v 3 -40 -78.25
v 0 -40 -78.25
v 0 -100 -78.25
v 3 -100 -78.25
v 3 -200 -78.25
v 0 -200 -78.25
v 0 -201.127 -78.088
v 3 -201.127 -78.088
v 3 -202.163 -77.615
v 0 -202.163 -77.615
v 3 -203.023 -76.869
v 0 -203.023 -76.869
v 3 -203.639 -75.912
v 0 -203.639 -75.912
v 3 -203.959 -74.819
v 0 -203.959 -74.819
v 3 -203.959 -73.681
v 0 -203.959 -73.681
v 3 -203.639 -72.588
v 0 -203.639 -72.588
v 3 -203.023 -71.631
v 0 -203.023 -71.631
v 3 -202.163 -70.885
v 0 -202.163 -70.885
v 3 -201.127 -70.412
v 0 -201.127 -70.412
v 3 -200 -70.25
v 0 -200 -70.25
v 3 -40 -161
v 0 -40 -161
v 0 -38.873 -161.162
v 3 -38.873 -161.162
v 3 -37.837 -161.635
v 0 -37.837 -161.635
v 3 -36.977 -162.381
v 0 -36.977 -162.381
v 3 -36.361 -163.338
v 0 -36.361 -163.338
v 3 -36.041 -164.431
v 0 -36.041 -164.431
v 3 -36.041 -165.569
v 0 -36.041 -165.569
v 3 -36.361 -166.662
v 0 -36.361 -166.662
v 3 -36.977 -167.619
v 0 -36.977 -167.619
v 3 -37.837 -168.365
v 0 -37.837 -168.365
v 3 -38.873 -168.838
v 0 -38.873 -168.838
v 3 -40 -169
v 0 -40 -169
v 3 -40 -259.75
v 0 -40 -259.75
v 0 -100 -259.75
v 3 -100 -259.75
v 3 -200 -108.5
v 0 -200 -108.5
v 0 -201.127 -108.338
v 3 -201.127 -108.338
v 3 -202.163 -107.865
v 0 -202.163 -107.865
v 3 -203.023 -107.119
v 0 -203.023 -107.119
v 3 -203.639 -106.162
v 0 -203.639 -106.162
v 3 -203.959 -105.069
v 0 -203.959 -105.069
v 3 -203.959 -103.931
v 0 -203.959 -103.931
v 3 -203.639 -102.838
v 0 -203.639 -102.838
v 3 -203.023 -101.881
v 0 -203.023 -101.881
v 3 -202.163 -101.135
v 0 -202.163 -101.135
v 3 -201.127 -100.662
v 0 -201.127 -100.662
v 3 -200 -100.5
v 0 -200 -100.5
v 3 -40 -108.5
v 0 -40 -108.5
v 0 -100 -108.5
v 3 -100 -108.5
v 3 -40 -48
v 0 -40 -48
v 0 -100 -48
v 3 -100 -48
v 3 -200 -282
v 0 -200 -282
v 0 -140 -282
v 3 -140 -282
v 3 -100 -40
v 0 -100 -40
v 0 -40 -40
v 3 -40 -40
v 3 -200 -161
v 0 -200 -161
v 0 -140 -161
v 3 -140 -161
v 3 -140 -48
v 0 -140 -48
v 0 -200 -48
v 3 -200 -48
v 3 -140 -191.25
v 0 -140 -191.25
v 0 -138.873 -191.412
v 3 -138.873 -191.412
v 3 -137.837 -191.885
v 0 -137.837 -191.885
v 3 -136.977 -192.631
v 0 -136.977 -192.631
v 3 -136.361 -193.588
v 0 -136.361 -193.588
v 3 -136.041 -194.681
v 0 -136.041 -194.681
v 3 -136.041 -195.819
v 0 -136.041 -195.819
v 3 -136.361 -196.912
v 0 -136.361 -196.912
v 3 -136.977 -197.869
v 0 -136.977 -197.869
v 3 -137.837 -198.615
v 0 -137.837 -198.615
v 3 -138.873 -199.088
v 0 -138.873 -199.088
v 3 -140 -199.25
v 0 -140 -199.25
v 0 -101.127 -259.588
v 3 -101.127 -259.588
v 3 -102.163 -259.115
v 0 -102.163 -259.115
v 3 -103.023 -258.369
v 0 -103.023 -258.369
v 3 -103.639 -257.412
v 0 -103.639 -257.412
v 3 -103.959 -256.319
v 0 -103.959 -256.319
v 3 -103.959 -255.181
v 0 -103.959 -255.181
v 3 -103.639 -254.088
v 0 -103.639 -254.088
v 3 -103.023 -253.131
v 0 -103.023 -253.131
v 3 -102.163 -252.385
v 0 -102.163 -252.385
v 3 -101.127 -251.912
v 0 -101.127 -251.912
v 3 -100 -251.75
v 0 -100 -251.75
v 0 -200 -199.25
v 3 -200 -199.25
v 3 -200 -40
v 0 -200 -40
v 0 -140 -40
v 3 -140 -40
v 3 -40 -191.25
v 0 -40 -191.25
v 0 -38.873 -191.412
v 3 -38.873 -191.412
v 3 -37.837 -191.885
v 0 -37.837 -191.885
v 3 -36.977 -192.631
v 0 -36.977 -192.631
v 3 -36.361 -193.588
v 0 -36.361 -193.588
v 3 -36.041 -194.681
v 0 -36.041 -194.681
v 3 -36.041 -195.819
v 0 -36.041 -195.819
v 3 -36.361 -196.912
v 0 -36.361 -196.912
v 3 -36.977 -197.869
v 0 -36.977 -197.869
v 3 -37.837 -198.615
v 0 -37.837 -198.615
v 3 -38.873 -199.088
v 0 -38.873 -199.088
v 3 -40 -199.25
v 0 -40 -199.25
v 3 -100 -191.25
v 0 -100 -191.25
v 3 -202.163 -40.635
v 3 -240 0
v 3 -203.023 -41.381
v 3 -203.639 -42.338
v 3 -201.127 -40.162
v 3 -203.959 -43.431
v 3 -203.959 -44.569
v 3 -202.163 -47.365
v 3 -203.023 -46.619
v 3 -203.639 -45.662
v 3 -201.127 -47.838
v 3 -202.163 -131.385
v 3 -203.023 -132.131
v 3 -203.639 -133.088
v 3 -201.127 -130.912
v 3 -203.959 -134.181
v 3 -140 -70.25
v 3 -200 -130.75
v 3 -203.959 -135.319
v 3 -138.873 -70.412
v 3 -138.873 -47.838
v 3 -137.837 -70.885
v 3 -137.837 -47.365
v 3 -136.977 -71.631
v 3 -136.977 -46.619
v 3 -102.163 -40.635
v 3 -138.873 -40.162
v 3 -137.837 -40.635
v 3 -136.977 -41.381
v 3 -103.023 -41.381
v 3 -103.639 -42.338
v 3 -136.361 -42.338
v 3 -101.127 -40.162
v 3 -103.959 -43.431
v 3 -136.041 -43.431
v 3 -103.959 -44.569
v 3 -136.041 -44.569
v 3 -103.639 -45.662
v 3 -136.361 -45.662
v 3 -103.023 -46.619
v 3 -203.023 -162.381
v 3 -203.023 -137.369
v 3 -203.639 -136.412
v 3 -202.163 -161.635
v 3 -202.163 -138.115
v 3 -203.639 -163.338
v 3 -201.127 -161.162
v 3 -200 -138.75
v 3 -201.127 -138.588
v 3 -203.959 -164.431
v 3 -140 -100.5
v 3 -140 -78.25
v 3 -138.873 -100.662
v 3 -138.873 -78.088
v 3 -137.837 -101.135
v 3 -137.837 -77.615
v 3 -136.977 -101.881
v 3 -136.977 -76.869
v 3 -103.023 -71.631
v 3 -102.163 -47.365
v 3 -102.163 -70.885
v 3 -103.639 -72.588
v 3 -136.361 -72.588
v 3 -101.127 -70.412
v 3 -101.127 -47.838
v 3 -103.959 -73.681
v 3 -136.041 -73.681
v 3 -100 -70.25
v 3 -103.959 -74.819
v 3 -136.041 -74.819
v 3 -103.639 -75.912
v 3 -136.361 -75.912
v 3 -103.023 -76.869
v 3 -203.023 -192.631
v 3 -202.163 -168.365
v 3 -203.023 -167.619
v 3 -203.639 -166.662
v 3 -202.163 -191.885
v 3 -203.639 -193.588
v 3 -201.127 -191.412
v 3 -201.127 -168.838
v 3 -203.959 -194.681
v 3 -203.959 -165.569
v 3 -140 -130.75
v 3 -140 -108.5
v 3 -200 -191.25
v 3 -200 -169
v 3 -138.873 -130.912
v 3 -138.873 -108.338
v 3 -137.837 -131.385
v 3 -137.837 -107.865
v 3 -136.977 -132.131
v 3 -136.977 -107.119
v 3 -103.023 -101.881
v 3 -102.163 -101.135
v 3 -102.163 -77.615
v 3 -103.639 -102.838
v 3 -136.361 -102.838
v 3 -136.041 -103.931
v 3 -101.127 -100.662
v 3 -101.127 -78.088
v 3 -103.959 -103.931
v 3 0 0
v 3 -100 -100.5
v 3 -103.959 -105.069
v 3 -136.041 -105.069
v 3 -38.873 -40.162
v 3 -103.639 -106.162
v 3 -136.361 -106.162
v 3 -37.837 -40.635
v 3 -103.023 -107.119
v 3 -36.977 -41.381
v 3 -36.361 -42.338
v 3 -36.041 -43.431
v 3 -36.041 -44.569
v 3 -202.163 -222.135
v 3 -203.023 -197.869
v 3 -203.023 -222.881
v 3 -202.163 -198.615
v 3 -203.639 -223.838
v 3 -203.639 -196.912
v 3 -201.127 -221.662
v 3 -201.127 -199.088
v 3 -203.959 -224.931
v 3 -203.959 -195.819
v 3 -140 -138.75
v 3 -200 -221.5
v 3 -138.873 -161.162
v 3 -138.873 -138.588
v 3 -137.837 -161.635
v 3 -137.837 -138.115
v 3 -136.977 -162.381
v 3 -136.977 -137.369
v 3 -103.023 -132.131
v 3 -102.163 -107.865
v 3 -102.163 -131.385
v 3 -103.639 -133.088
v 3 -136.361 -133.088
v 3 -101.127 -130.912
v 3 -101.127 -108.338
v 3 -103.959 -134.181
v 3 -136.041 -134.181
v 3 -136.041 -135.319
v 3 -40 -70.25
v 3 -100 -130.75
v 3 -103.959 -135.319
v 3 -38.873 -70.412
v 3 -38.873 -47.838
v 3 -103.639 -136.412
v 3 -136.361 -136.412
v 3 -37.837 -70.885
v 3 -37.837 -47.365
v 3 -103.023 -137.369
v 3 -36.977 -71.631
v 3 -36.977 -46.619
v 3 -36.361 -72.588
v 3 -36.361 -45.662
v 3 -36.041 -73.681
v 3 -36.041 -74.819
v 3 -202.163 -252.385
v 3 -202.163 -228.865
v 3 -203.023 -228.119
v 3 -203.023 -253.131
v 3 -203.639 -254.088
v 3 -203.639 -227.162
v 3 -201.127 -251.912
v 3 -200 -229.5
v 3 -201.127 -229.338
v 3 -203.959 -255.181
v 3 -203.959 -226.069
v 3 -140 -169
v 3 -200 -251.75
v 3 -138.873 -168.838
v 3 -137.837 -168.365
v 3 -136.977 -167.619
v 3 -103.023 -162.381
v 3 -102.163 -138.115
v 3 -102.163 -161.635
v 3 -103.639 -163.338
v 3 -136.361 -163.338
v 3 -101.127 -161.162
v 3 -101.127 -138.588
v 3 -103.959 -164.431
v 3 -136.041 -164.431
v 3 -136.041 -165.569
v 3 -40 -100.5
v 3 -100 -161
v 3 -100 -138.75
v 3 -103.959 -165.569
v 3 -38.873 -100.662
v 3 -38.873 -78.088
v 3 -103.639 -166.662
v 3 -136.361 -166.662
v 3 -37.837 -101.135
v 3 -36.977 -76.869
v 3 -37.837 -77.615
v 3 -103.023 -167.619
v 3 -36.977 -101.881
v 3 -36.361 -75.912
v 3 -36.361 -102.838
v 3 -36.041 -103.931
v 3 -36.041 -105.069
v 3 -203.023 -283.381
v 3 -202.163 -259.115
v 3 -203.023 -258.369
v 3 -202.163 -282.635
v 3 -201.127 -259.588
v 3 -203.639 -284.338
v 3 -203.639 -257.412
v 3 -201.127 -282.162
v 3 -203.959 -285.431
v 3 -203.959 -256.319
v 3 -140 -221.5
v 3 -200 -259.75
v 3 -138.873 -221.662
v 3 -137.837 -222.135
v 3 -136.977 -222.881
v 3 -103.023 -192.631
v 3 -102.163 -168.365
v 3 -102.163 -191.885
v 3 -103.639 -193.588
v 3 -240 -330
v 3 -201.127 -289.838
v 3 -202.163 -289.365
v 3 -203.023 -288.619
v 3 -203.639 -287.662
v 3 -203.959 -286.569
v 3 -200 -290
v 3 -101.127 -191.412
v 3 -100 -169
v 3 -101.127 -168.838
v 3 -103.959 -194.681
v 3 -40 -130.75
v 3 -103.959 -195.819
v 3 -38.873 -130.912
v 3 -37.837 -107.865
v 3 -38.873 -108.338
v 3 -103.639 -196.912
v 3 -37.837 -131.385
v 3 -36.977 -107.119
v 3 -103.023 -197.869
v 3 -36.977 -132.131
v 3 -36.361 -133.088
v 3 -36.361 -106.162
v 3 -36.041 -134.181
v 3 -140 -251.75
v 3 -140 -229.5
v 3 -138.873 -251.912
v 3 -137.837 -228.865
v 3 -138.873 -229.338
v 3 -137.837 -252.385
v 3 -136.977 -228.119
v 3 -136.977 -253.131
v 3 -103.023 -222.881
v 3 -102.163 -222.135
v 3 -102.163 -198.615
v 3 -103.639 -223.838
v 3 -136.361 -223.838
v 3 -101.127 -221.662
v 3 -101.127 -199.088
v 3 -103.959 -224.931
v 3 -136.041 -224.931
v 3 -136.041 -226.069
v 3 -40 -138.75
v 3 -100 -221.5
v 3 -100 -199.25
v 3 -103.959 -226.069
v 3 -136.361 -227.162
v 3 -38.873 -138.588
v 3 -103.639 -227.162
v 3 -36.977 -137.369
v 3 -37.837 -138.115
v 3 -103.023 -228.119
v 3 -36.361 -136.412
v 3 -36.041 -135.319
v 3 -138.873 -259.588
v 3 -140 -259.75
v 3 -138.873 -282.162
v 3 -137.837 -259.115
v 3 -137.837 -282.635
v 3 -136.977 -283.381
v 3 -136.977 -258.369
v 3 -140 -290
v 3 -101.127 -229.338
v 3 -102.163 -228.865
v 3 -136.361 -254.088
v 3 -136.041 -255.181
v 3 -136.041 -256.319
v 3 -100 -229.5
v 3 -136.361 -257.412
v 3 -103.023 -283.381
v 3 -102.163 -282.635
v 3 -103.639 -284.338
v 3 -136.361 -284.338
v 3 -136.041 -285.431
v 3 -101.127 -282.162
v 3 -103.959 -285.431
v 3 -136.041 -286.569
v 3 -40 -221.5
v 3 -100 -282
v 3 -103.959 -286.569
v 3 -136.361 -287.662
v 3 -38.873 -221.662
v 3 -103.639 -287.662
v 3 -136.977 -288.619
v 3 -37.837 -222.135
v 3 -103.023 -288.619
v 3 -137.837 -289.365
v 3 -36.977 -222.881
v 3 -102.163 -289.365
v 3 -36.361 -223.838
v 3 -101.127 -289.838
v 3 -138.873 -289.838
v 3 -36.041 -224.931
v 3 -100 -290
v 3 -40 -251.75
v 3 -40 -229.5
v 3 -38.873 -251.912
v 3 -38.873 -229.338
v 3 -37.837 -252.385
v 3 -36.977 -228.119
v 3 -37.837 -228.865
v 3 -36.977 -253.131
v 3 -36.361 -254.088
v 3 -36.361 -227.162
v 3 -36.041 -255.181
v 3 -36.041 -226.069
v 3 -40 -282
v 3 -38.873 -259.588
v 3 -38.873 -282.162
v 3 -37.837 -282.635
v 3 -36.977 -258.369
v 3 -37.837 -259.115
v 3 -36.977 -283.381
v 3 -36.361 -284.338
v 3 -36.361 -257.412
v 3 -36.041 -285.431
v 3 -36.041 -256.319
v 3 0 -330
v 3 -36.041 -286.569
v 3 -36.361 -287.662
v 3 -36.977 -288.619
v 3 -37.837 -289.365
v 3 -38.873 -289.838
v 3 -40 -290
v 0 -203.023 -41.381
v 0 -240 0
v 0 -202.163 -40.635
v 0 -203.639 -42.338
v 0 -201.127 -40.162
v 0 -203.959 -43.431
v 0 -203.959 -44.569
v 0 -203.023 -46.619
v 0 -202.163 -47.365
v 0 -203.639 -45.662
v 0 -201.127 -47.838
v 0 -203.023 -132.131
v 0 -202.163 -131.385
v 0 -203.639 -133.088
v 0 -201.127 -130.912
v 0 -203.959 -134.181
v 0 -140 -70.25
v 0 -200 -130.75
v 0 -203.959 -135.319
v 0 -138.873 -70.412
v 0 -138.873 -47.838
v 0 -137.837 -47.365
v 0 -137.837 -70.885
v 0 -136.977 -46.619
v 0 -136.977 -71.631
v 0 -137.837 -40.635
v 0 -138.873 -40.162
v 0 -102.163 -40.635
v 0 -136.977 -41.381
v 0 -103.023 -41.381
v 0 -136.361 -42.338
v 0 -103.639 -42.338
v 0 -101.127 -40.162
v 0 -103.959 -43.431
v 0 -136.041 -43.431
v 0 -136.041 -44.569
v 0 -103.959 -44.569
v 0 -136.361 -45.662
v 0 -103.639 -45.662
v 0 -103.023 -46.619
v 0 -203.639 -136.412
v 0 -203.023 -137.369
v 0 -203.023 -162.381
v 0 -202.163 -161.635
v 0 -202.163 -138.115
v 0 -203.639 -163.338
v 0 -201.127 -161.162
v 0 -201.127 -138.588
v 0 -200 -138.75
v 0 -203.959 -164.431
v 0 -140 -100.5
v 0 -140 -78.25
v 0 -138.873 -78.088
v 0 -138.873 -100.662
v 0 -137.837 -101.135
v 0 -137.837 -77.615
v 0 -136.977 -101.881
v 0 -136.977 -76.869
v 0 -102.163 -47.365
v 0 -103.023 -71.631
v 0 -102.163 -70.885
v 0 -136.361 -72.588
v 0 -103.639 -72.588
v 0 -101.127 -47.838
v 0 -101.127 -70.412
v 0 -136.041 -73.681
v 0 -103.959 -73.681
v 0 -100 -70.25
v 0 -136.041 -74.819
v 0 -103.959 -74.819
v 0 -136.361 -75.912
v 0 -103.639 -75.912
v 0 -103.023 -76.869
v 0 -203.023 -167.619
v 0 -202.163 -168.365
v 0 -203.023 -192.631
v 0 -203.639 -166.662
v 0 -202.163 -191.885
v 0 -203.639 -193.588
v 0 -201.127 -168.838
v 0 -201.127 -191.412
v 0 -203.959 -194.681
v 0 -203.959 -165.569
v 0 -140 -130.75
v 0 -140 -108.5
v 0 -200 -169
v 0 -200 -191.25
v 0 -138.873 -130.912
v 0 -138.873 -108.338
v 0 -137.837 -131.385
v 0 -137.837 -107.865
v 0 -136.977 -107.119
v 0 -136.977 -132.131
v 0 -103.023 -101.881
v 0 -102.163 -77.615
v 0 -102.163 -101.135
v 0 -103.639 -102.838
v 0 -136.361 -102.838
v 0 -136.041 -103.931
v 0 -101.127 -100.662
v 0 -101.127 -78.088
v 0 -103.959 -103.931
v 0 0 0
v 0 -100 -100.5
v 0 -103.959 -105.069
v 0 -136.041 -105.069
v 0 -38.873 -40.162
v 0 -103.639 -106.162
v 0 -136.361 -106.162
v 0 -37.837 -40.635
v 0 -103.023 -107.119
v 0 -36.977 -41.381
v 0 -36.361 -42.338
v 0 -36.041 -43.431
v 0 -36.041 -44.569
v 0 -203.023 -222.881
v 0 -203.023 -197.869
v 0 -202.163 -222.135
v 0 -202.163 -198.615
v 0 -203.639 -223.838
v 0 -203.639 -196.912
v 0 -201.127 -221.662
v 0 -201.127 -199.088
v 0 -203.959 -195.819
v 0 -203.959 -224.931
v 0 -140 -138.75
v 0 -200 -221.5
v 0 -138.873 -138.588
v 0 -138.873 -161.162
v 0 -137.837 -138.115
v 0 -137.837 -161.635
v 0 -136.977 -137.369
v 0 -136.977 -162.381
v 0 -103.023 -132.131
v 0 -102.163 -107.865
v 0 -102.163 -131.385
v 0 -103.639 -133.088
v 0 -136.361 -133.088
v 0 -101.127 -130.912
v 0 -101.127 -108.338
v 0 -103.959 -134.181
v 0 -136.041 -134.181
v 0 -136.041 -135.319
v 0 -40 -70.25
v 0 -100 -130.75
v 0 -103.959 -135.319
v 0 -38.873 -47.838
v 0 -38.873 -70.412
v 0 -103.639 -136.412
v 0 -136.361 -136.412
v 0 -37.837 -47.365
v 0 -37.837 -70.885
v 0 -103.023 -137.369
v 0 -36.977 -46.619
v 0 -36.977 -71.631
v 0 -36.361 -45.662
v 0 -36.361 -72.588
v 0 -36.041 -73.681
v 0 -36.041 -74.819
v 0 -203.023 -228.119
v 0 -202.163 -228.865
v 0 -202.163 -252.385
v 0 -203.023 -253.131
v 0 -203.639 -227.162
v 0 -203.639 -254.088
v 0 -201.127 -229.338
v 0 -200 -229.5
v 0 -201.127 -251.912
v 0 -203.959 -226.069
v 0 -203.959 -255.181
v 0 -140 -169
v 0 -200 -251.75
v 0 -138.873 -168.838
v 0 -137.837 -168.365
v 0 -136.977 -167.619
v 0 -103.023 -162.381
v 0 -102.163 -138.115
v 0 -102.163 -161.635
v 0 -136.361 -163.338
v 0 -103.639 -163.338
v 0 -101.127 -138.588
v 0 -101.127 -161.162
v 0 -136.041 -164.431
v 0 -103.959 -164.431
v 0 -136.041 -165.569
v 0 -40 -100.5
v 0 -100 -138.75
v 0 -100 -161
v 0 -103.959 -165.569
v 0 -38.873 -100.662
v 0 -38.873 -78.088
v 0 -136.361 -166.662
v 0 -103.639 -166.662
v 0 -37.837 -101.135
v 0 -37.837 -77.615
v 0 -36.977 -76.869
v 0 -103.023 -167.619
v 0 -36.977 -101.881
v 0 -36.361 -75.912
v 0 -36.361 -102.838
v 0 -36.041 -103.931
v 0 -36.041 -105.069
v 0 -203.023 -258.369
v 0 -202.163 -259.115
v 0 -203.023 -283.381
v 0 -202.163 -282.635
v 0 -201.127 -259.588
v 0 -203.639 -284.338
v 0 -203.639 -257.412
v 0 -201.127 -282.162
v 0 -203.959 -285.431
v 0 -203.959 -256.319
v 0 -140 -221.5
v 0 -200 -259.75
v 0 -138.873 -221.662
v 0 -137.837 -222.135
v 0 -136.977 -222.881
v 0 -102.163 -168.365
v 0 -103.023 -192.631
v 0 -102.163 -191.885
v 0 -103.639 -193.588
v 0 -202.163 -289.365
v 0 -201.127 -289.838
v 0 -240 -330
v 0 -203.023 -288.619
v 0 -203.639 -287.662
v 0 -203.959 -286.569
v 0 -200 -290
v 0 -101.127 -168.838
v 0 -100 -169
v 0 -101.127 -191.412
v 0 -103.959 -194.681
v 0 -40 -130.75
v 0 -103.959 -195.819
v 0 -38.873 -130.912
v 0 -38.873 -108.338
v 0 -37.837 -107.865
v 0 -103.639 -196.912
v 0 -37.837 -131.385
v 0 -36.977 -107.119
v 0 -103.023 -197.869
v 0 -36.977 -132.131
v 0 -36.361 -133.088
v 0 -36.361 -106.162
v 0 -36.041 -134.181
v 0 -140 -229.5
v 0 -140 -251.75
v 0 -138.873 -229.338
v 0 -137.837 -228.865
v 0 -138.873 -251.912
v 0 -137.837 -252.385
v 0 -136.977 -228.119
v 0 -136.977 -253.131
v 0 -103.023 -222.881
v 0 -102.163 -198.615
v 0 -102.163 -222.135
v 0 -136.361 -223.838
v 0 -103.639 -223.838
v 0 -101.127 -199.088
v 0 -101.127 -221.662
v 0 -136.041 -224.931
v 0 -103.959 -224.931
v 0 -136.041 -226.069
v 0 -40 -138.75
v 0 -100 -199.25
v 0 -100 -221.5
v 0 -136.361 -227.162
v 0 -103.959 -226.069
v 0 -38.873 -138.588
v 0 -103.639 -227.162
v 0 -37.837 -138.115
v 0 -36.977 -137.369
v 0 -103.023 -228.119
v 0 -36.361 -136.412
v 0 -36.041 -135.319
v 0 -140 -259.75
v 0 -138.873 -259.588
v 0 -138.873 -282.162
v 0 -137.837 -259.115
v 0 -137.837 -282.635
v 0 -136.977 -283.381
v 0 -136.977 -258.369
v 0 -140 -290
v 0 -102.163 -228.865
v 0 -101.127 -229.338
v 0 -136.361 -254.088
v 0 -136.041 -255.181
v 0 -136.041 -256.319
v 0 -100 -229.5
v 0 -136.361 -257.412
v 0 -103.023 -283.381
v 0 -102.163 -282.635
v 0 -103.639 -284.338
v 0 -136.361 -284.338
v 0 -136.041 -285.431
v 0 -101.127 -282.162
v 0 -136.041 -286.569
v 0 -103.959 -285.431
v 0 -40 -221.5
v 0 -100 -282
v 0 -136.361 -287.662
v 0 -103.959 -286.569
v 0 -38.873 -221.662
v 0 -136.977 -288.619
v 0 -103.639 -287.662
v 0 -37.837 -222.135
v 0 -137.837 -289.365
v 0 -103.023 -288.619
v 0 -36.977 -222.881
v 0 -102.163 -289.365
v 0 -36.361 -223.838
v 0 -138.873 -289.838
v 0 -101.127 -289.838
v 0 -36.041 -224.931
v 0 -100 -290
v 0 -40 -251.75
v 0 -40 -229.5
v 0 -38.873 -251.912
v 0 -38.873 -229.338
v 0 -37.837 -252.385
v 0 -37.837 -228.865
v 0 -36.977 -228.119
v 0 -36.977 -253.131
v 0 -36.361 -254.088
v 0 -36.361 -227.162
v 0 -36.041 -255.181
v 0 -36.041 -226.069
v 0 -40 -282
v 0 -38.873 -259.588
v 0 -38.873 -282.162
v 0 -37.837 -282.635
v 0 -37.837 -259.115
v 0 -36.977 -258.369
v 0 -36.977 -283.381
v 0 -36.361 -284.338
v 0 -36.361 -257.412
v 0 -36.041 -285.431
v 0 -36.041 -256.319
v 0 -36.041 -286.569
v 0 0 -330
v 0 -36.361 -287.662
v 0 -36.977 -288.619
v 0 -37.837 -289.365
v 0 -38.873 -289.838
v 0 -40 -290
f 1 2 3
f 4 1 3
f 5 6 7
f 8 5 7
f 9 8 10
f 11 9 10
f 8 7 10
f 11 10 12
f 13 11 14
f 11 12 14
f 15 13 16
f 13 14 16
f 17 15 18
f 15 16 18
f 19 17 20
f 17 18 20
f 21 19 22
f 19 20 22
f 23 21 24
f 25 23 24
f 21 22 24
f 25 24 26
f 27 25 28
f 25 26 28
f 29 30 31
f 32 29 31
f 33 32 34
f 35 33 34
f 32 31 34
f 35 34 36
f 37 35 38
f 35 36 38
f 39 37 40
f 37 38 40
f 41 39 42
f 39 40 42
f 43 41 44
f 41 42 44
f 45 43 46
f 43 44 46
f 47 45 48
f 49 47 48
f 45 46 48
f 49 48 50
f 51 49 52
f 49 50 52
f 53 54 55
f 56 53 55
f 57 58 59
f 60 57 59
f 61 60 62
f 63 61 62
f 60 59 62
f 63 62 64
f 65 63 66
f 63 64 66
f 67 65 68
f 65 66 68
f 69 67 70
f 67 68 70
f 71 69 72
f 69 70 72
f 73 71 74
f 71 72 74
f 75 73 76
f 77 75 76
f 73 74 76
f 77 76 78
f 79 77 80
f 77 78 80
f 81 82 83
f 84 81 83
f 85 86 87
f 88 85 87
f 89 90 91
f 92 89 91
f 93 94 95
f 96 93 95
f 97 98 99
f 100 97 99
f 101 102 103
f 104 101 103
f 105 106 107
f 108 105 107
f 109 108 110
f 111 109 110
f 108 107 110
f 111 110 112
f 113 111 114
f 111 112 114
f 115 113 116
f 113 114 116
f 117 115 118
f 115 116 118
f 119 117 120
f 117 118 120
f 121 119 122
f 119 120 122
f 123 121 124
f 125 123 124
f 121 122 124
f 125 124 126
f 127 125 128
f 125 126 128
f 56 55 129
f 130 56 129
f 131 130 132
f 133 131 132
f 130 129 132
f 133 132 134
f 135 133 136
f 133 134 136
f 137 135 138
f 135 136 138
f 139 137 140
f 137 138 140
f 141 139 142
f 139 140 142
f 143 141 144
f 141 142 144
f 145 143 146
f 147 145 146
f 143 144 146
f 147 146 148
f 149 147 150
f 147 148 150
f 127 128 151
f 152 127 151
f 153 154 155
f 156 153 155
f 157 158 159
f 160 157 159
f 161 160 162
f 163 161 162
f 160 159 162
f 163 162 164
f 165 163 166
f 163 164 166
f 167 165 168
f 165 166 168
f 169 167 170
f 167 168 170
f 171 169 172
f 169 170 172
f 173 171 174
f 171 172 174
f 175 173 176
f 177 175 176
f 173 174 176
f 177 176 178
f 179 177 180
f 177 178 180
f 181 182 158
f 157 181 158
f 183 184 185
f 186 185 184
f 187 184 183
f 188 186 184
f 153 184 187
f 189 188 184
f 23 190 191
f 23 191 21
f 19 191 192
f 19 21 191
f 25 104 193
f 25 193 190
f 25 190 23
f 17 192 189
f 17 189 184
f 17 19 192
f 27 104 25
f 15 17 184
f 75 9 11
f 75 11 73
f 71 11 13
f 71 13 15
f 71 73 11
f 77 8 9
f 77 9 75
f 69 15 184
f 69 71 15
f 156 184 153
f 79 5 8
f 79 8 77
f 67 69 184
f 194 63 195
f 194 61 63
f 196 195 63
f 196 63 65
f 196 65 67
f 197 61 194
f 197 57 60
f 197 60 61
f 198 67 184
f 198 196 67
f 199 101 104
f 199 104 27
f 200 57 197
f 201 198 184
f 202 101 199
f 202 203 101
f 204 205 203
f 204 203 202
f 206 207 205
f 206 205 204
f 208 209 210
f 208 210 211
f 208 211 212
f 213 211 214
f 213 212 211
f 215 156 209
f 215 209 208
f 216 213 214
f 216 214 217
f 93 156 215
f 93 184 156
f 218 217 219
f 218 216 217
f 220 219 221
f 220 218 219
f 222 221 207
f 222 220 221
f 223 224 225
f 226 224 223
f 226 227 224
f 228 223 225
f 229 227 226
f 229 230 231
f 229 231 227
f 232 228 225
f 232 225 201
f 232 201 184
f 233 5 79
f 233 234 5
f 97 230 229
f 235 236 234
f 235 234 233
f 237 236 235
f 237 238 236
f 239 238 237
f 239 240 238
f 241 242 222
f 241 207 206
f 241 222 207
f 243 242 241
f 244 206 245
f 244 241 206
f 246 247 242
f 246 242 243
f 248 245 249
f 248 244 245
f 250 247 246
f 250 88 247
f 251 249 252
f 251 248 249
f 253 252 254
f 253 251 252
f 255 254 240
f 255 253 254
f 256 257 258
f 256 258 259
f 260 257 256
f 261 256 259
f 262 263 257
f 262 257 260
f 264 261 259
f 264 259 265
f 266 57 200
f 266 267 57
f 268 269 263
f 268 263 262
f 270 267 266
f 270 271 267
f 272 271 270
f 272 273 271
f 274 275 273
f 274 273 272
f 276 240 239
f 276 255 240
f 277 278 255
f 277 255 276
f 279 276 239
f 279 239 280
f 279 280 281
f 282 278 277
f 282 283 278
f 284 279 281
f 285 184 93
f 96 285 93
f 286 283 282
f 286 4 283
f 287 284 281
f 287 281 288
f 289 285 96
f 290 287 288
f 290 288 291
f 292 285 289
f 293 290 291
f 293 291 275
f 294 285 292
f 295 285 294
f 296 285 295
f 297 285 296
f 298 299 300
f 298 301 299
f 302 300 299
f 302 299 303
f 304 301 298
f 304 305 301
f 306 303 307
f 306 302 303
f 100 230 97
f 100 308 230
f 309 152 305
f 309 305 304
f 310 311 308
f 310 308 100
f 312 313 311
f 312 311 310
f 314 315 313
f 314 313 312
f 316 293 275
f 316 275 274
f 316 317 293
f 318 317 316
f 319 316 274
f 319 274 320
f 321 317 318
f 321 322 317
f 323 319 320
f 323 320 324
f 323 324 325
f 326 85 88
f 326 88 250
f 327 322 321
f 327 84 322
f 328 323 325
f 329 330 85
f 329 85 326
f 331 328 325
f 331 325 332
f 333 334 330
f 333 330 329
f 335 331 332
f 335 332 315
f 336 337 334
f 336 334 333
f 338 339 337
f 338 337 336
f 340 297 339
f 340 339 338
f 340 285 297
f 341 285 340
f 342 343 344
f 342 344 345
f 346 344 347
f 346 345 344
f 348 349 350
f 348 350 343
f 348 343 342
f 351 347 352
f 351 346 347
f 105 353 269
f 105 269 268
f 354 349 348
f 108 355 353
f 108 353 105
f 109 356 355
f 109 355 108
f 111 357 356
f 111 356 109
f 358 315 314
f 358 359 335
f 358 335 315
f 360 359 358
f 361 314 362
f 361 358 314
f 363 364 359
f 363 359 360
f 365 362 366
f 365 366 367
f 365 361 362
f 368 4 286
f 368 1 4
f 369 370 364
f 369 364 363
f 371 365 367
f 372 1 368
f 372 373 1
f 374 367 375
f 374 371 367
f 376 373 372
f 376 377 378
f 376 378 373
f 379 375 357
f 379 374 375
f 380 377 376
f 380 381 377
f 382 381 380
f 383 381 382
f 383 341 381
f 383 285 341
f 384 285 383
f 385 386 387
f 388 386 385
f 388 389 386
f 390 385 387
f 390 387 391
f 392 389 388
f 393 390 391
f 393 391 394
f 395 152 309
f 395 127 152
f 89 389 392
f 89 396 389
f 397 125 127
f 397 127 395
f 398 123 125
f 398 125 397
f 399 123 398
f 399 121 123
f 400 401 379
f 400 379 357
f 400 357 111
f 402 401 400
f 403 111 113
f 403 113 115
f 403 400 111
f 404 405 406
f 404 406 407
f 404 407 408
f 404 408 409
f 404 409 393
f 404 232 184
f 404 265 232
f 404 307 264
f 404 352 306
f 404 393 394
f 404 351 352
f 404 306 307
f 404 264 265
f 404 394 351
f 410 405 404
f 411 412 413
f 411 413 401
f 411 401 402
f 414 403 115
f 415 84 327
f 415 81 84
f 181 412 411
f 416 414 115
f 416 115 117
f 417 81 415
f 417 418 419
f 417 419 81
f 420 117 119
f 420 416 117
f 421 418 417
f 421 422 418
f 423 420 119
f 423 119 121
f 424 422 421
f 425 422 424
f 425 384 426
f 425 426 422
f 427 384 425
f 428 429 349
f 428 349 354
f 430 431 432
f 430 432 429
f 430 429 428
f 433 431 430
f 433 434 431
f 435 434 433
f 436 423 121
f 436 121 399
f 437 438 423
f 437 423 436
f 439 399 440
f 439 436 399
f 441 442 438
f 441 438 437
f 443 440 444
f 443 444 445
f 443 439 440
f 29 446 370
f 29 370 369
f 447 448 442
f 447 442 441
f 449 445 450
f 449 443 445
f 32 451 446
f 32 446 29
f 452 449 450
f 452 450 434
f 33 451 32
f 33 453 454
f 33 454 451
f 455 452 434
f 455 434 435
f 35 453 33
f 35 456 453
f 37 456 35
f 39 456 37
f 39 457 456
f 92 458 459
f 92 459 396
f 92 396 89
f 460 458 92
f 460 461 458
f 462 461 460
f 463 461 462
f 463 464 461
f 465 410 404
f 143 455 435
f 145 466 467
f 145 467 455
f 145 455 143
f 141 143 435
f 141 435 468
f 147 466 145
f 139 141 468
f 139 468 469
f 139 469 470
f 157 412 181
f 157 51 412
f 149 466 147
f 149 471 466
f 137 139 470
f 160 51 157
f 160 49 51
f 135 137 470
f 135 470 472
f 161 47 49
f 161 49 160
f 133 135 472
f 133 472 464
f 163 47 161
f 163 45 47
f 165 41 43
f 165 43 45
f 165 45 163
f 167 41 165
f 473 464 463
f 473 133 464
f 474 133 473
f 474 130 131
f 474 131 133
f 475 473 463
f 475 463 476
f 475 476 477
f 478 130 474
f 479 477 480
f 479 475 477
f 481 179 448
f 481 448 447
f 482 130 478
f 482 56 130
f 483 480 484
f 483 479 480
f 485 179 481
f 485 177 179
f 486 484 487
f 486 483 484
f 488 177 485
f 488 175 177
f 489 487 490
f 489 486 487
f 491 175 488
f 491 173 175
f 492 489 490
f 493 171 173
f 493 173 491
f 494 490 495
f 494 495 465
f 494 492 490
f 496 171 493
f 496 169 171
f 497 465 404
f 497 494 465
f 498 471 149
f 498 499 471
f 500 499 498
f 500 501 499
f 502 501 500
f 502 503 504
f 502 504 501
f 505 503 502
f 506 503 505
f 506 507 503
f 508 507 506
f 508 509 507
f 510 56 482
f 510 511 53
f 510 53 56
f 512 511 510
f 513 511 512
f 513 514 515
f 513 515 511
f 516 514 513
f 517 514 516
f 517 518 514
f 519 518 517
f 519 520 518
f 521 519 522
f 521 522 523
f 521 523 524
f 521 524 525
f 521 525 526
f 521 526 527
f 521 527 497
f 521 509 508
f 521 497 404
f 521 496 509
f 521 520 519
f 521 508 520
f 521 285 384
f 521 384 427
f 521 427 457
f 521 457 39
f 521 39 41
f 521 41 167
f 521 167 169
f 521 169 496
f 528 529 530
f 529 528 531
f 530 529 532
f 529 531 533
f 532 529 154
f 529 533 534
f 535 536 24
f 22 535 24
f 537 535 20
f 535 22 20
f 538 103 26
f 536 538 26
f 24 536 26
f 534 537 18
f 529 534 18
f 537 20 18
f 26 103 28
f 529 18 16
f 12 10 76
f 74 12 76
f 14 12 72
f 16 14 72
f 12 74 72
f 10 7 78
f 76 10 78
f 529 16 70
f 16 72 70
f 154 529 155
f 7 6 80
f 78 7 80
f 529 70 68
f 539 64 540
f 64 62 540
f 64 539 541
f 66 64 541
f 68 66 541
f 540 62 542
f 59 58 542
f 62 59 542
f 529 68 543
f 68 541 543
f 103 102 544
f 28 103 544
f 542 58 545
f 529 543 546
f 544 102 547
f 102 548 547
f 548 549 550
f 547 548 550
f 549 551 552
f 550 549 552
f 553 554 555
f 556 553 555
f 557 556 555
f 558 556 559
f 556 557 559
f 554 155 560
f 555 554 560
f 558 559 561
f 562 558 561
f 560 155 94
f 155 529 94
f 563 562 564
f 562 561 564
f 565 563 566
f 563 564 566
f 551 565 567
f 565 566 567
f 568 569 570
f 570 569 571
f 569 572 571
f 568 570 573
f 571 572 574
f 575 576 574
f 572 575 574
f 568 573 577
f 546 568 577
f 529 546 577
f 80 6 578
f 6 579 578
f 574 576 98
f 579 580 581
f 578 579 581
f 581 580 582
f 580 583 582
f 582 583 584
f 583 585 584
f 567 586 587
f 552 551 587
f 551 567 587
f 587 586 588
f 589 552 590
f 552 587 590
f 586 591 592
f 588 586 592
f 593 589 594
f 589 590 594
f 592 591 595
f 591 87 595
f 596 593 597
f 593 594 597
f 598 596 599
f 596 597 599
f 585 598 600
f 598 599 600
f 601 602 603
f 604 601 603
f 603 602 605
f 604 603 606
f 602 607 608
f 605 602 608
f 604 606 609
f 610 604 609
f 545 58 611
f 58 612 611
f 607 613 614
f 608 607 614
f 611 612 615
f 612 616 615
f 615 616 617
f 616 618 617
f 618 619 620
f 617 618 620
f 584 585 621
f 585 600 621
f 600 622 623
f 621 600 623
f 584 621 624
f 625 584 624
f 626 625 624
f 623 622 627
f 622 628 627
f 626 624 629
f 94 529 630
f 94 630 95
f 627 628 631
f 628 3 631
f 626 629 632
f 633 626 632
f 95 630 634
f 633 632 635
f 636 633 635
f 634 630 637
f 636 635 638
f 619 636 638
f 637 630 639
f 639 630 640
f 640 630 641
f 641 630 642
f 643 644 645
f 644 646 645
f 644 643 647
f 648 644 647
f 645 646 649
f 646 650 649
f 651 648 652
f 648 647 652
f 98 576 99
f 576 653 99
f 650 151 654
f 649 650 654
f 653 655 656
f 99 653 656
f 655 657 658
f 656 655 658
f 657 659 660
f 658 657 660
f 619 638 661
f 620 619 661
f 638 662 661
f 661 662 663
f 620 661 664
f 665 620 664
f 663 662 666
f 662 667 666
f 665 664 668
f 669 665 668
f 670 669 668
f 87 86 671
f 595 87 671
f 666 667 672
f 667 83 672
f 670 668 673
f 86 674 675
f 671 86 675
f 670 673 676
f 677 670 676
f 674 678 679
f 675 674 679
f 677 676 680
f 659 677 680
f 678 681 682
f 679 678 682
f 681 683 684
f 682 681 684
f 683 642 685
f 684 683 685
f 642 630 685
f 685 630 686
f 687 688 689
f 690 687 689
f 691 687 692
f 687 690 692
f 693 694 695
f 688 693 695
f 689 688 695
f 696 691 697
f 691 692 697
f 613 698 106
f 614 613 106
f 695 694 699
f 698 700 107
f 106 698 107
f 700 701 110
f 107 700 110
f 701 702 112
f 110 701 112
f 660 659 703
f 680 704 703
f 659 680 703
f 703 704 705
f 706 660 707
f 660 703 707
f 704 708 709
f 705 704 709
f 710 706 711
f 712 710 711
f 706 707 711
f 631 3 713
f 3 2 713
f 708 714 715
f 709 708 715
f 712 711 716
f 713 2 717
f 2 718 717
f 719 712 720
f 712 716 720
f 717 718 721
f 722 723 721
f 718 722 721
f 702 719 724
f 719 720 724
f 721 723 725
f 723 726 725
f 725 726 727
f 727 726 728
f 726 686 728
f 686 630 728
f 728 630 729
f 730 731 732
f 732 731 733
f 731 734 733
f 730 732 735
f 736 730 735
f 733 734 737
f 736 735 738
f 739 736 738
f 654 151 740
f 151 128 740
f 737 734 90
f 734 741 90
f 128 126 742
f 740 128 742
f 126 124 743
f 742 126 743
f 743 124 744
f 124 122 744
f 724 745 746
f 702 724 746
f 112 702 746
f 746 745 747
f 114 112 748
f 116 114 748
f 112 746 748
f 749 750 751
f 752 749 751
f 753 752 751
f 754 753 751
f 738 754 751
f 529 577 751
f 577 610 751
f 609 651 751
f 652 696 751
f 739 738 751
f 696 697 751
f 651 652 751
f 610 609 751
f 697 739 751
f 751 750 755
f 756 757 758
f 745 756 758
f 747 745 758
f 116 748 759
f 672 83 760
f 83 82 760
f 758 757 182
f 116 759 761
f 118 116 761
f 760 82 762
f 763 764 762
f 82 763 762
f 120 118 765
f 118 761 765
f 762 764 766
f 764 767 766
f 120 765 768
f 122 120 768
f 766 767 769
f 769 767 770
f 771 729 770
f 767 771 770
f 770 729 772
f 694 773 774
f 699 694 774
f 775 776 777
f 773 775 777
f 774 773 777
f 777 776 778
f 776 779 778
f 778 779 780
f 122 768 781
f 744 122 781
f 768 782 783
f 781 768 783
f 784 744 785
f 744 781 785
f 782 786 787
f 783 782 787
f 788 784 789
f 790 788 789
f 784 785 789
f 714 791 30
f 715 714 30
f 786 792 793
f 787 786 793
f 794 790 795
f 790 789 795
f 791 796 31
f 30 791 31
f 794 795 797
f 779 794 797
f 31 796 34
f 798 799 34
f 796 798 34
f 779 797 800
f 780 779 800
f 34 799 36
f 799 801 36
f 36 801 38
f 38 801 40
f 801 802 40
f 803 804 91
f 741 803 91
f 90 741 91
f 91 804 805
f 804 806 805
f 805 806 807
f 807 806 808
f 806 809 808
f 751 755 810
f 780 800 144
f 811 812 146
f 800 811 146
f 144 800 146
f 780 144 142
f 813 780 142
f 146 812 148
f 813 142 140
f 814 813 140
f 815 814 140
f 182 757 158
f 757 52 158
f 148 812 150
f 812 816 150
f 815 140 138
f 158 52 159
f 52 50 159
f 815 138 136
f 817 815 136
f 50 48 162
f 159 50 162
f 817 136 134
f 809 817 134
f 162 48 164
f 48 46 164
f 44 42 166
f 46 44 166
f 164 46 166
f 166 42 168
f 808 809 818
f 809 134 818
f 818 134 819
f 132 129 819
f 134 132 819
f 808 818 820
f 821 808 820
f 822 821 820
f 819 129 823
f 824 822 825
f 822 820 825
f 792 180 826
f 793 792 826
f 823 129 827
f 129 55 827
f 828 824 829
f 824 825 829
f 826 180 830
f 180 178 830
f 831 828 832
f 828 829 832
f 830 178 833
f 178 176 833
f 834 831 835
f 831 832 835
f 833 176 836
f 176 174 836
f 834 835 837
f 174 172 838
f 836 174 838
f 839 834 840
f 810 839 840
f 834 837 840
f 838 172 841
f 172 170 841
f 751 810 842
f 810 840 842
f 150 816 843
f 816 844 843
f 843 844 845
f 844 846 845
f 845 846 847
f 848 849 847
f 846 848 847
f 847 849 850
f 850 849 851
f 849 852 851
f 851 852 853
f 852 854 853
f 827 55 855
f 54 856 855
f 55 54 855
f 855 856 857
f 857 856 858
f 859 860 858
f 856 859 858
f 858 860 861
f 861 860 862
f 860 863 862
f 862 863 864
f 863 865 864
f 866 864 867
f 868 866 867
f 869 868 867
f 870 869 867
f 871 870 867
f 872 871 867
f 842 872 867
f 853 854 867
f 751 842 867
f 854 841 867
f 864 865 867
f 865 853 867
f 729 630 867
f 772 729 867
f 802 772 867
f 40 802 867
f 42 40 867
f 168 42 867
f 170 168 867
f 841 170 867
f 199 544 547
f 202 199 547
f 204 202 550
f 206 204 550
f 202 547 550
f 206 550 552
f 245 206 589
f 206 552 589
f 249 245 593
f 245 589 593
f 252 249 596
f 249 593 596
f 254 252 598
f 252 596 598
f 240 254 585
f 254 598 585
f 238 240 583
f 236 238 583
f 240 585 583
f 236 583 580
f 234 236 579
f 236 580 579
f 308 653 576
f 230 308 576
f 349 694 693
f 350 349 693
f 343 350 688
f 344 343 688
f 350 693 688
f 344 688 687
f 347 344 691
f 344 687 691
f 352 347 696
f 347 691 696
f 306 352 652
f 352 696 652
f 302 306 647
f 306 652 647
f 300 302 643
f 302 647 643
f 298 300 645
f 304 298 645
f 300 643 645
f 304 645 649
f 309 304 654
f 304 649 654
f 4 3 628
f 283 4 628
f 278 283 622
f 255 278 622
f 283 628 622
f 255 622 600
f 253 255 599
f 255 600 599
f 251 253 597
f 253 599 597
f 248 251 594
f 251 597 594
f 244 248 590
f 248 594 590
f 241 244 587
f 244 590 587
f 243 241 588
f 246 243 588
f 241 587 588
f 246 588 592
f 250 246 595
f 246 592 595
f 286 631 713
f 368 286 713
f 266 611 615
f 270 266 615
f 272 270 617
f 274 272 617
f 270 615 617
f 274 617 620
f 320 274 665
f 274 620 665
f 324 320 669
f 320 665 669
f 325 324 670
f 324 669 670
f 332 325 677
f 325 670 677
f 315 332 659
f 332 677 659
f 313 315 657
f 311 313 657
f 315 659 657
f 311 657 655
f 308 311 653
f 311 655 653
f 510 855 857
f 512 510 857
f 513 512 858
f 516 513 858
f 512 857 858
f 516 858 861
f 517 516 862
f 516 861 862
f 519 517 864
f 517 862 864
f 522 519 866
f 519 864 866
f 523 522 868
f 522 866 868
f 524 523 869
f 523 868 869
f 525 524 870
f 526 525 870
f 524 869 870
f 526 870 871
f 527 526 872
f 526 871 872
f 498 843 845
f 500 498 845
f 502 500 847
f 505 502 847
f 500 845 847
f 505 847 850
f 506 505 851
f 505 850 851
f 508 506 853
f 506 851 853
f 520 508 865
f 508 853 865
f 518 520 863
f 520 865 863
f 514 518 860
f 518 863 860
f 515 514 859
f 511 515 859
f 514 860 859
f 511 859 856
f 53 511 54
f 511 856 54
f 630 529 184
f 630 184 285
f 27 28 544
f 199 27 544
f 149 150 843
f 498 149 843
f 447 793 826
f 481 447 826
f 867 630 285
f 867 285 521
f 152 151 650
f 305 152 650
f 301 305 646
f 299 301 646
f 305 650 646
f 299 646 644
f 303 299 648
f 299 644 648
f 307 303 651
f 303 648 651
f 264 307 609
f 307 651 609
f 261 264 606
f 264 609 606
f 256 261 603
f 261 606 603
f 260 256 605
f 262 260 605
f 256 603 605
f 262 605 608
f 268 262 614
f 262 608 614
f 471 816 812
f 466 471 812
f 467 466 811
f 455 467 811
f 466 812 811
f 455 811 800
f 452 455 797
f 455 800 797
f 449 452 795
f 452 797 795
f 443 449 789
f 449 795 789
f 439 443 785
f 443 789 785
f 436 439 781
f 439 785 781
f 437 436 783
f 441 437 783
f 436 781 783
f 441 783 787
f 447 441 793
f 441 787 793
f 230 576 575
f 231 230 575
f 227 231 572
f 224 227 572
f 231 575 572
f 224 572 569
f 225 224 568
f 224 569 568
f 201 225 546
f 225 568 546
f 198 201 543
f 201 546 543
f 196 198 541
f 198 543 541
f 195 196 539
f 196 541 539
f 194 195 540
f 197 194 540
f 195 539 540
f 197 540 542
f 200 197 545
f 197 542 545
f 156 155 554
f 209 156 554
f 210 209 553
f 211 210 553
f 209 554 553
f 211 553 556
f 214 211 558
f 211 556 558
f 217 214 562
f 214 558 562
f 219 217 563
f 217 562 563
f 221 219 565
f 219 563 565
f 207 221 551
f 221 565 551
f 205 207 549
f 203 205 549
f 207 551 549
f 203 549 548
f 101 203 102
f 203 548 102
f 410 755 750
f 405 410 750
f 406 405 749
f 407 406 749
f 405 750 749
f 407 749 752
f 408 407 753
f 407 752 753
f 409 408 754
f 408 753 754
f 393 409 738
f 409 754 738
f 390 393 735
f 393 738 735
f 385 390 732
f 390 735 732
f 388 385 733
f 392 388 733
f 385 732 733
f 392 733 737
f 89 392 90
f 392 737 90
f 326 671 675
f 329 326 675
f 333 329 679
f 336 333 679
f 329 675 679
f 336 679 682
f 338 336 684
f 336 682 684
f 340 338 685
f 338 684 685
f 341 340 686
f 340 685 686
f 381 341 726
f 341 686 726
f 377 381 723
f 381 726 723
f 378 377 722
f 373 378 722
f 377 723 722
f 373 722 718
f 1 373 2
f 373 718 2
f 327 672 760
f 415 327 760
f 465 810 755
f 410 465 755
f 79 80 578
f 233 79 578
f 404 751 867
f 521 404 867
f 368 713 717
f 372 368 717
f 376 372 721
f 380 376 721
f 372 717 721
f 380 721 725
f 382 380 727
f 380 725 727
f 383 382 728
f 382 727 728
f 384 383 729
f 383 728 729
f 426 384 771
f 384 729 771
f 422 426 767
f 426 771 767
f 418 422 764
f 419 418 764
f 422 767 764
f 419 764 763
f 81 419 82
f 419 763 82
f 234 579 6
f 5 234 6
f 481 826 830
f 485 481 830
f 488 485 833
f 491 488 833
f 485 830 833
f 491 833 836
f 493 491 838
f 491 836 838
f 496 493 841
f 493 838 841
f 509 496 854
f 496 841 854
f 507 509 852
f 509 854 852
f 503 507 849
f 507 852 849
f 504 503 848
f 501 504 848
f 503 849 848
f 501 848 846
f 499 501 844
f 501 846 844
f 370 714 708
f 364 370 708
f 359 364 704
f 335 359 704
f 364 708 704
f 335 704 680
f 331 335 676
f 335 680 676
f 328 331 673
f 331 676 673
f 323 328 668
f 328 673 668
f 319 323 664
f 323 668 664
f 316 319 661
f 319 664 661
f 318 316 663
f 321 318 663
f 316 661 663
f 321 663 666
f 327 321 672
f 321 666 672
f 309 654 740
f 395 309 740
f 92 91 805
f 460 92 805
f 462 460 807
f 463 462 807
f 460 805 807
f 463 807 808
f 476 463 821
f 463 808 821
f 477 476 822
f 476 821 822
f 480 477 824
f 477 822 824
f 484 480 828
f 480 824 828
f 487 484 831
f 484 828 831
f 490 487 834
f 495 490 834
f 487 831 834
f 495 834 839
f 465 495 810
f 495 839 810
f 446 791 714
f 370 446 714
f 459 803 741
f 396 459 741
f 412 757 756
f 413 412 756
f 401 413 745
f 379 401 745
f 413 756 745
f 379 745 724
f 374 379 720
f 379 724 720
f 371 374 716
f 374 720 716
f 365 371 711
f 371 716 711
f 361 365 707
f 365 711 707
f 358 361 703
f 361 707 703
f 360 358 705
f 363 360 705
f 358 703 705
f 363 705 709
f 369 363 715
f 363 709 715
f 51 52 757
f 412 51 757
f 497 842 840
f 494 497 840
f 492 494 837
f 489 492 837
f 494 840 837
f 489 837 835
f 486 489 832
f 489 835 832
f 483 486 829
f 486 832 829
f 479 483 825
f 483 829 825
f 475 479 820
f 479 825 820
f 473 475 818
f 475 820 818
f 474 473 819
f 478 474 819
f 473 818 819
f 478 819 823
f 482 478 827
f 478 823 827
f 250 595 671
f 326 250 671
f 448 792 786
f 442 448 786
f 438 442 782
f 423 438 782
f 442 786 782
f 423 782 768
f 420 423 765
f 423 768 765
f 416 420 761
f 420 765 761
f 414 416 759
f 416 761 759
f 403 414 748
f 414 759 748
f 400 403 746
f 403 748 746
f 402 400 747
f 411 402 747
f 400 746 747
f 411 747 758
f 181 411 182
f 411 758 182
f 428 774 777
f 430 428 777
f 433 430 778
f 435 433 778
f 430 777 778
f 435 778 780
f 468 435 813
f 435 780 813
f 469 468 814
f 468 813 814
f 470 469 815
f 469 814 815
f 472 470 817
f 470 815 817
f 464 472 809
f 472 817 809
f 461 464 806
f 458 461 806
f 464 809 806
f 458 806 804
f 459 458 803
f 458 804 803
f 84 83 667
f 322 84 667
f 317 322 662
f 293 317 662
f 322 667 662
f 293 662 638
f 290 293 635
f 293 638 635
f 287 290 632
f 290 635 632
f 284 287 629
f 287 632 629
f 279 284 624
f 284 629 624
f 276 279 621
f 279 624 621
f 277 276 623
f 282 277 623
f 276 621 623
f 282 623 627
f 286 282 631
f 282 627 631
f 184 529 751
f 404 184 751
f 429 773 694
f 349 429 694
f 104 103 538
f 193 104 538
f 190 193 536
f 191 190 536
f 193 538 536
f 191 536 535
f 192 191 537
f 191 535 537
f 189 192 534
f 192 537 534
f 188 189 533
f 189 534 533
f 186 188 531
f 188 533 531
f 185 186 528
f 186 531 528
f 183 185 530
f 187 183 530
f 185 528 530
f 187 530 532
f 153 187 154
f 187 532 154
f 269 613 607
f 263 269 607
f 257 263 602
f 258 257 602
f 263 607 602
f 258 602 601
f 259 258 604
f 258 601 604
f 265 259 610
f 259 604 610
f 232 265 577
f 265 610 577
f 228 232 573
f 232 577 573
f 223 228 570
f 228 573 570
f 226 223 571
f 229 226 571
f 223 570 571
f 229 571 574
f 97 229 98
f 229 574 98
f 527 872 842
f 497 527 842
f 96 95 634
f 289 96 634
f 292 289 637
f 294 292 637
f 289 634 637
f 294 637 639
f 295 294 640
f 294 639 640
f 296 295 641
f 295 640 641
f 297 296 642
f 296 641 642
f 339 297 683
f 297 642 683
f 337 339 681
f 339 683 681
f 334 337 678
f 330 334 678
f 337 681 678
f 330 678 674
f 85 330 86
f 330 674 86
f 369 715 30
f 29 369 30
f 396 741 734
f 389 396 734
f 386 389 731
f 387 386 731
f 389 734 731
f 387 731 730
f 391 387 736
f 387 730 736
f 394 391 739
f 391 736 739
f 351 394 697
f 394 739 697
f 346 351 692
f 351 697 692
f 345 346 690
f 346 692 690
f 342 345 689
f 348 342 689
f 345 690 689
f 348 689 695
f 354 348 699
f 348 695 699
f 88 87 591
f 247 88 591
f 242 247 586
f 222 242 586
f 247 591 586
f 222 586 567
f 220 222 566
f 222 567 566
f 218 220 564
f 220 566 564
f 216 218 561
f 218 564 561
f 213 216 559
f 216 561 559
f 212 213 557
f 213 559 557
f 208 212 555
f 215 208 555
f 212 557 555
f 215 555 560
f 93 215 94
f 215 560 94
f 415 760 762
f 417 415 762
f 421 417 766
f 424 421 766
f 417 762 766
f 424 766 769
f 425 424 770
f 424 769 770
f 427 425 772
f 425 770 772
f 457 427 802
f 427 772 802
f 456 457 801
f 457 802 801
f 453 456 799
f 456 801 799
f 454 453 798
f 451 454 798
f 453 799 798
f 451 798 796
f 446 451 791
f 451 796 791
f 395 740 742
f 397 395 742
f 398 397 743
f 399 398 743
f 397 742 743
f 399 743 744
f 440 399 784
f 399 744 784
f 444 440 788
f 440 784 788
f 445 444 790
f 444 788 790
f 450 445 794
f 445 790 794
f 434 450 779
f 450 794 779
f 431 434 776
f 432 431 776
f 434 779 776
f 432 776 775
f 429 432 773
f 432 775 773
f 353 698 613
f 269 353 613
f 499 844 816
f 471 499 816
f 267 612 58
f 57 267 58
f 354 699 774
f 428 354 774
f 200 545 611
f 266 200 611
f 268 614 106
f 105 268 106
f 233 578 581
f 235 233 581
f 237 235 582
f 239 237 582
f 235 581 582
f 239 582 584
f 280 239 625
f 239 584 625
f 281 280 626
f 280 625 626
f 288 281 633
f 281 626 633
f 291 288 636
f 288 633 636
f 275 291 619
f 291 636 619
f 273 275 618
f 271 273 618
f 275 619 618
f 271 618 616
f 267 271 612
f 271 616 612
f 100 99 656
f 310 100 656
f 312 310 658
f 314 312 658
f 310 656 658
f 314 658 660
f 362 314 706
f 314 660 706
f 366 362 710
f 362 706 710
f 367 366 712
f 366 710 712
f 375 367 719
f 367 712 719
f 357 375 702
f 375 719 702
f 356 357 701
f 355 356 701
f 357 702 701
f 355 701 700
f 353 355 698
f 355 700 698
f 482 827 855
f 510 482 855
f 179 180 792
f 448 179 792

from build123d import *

# Parameters (mm, degrees)
IZIM1_W                     = 330
IZIM1_H                     = 240
Y_KSEKLIK_EKSTR_ZYON1_DEPTH = 3


with BuildPart() as part:
    # Çizim1 → Yükseklik-Ekstrüzyon1 (new body)
    with BuildSketch(Plane(origin=(0, 0, 0), x_dir=(0, 0, -1), z_dir=(1, 0, 0))):
        with Locations((165, -120)):
            Rectangle(IZIM1_W, IZIM1_H)
        with BuildLine():
            Line((48, -40), (48, -100))
            ThreePointArc((48, -100), (44, -104), (40, -100))
            Line((40, -100), (40, -40))
            ThreePointArc((40, -40), (44, -36), (48, -40))
        make_face(mode=Mode.SUBTRACT)
        with BuildLine():
            Line((78.25, -40), (78.25, -100))
            ThreePointArc((78.25, -100), (74.25, -104), (70.25, -100))
            Line((70.25, -100), (70.25, -40))
            ThreePointArc((70.25, -40), (74.25, -36), (78.25, -40))
        make_face(mode=Mode.SUBTRACT)
        with BuildLine():
            Line((108.5, -40), (108.5, -100))
            ThreePointArc((108.5, -100), (104.5, -104), (100.5, -100))
            Line((100.5, -100), (100.5, -40))
            ThreePointArc((100.5, -40), (104.5, -36), (108.5, -40))
        make_face(mode=Mode.SUBTRACT)
        with BuildLine():
            Line((138.75, -40), (138.75, -100))
            ThreePointArc((138.75, -100), (134.75, -104), (130.75, -100))
            Line((130.75, -100), (130.75, -40))
            ThreePointArc((130.75, -40), (134.75, -36), (138.75, -40))
        make_face(mode=Mode.SUBTRACT)
        with BuildLine():
            Line((169, -40), (169, -100))
            ThreePointArc((169, -100), (165, -104), (161, -100))
            Line((161, -100), (161, -40))
            ThreePointArc((161, -40), (165, -36), (169, -40))
        make_face(mode=Mode.SUBTRACT)
        with BuildLine():
            Line((199.25, -40), (199.25, -100))
            ThreePointArc((199.25, -100), (195.25, -104), (191.25, -100))
            Line((191.25, -100), (191.25, -40))
            ThreePointArc((191.25, -40), (195.25, -36), (199.25, -40))
        make_face(mode=Mode.SUBTRACT)
        with BuildLine():
            Line((229.5, -40), (229.5, -100))
            ThreePointArc((229.5, -100), (225.5, -104), (221.5, -100))
            Line((221.5, -100), (221.5, -40))
            ThreePointArc((221.5, -40), (225.5, -36), (229.5, -40))
        make_face(mode=Mode.SUBTRACT)
        with BuildLine():
            Line((259.75, -40), (259.75, -100))
            ThreePointArc((259.75, -100), (255.75, -104), (251.75, -100))
            Line((251.75, -100), (251.75, -40))
            ThreePointArc((251.75, -40), (255.75, -36), (259.75, -40))
        make_face(mode=Mode.SUBTRACT)
        with BuildLine():
            Line((290, -40), (290, -100))
            ThreePointArc((290, -100), (286, -104), (282, -100))
            Line((282, -100), (282, -40))
            ThreePointArc((282, -40), (286, -36), (290, -40))
        make_face(mode=Mode.SUBTRACT)
        with BuildLine():
            Line((78.25, -140), (78.25, -200))
            ThreePointArc((78.25, -200), (74.25, -204), (70.25, -200))
            Line((70.25, -200), (70.25, -140))
            ThreePointArc((70.25, -140), (74.25, -136), (78.25, -140))
        make_face(mode=Mode.SUBTRACT)
        with BuildLine():
            Line((108.5, -140), (108.5, -200))
            ThreePointArc((108.5, -200), (104.5, -204), (100.5, -200))
            Line((100.5, -200), (100.5, -140))
            ThreePointArc((100.5, -140), (104.5, -136), (108.5, -140))
        make_face(mode=Mode.SUBTRACT)
        with BuildLine():
            Line((138.75, -140), (138.75, -200))
            ThreePointArc((138.75, -200), (134.75, -204), (130.75, -200))
            Line((130.75, -200), (130.75, -140))
            ThreePointArc((130.75, -140), (134.75, -136), (138.75, -140))
        make_face(mode=Mode.SUBTRACT)
        with BuildLine():
            Line((169, -140), (169, -200))
            ThreePointArc((169, -200), (165, -204), (161, -200))
            Line((161, -200), (161, -140))
            ThreePointArc((161, -140), (165, -136), (169, -140))
        make_face(mode=Mode.SUBTRACT)
        with BuildLine():
            Line((199.25, -140), (199.25, -200))
            ThreePointArc((199.25, -200), (195.25, -204), (191.25, -200))
            Line((191.25, -200), (191.25, -140))
            ThreePointArc((191.25, -140), (195.25, -136), (199.25, -140))
        make_face(mode=Mode.SUBTRACT)
        with BuildLine():
            Line((229.5, -140), (229.5, -200))
            ThreePointArc((229.5, -200), (225.5, -204), (221.5, -200))
            Line((221.5, -200), (221.5, -140))
            ThreePointArc((221.5, -140), (225.5, -136), (229.5, -140))
        make_face(mode=Mode.SUBTRACT)
        with BuildLine():
            Line((259.75, -140), (259.75, -200))
            ThreePointArc((259.75, -200), (255.75, -204), (251.75, -200))
            Line((251.75, -200), (251.75, -140))
            ThreePointArc((251.75, -140), (255.75, -136), (259.75, -140))
        make_face(mode=Mode.SUBTRACT)
        with BuildLine():
            Line((290, -140), (290, -200))
            ThreePointArc((290, -200), (286, -204), (282, -200))
            Line((282, -200), (282, -140))
            ThreePointArc((282, -140), (286, -136), (290, -140))
        make_face(mode=Mode.SUBTRACT)
        with BuildLine():
            Line((48, -140), (48, -200))
            ThreePointArc((48, -200), (44, -204), (40, -200))
            Line((40, -200), (40, -140))
            ThreePointArc((40, -140), (44, -136), (48, -140))
        make_face(mode=Mode.SUBTRACT)
    extrude(amount=Y_KSEKLIK_EKSTR_ZYON1_DEPTH)


solid = part.part
